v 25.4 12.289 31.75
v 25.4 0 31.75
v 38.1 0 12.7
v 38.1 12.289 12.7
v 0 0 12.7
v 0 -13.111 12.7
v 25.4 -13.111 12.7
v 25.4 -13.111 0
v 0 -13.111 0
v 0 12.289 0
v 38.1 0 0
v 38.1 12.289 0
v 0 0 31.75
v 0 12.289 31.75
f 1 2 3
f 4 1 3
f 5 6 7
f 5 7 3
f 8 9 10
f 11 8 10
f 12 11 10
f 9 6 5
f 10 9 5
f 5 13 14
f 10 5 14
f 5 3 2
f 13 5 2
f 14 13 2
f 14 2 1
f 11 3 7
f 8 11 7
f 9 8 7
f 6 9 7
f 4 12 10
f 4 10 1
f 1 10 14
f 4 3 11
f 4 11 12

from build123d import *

# Parameters (mm, degrees)
F0_W     = 25.4
F0_H     = 31.75
F1_DEPTH = 38.1
F2_W     = 13.111336
F2_H     = 19.05
F3_DEPTH = 38.101
F5_DEPTH = 12.289664
F7_DEPTH = 25.4


with BuildPart() as f1:
    # F0 (on Right) → F1 (new body)
    with BuildSketch(Plane.YZ):
        with Locations((-0.411336, 15.875)):
            Rectangle(F0_W, F0_H)
    extrude(amount=F1_DEPTH)

    # F2 (on face) → F3 (cut, through all)
    with BuildSketch(Plane.YZ.offset(38.1)):
        with Locations((-6.555668, 22.225)):
            Rectangle(F2_W, F2_H)
    extrude(amount=-F3_DEPTH, mode=Mode.SUBTRACT)

    # F4 (on face) → F5 (cut, through all)
    with BuildSketch(Plane.XZ):
        Polygon((25.4, 31.75), (38.1, 12.7), (38.1, 31.75), align=None)
    extrude(amount=-F5_DEPTH, mode=Mode.SUBTRACT)

    # F6 (on face) → F7 (cut)
    with BuildSketch(Plane.XY.offset(12.7)):
        Polygon((38.1, -13.111336), (38.1, 0), (25.4, -13.111336), align=None)
    extrude(amount=-F7_DEPTH, mode=Mode.SUBTRACT)


solid = f1.part
